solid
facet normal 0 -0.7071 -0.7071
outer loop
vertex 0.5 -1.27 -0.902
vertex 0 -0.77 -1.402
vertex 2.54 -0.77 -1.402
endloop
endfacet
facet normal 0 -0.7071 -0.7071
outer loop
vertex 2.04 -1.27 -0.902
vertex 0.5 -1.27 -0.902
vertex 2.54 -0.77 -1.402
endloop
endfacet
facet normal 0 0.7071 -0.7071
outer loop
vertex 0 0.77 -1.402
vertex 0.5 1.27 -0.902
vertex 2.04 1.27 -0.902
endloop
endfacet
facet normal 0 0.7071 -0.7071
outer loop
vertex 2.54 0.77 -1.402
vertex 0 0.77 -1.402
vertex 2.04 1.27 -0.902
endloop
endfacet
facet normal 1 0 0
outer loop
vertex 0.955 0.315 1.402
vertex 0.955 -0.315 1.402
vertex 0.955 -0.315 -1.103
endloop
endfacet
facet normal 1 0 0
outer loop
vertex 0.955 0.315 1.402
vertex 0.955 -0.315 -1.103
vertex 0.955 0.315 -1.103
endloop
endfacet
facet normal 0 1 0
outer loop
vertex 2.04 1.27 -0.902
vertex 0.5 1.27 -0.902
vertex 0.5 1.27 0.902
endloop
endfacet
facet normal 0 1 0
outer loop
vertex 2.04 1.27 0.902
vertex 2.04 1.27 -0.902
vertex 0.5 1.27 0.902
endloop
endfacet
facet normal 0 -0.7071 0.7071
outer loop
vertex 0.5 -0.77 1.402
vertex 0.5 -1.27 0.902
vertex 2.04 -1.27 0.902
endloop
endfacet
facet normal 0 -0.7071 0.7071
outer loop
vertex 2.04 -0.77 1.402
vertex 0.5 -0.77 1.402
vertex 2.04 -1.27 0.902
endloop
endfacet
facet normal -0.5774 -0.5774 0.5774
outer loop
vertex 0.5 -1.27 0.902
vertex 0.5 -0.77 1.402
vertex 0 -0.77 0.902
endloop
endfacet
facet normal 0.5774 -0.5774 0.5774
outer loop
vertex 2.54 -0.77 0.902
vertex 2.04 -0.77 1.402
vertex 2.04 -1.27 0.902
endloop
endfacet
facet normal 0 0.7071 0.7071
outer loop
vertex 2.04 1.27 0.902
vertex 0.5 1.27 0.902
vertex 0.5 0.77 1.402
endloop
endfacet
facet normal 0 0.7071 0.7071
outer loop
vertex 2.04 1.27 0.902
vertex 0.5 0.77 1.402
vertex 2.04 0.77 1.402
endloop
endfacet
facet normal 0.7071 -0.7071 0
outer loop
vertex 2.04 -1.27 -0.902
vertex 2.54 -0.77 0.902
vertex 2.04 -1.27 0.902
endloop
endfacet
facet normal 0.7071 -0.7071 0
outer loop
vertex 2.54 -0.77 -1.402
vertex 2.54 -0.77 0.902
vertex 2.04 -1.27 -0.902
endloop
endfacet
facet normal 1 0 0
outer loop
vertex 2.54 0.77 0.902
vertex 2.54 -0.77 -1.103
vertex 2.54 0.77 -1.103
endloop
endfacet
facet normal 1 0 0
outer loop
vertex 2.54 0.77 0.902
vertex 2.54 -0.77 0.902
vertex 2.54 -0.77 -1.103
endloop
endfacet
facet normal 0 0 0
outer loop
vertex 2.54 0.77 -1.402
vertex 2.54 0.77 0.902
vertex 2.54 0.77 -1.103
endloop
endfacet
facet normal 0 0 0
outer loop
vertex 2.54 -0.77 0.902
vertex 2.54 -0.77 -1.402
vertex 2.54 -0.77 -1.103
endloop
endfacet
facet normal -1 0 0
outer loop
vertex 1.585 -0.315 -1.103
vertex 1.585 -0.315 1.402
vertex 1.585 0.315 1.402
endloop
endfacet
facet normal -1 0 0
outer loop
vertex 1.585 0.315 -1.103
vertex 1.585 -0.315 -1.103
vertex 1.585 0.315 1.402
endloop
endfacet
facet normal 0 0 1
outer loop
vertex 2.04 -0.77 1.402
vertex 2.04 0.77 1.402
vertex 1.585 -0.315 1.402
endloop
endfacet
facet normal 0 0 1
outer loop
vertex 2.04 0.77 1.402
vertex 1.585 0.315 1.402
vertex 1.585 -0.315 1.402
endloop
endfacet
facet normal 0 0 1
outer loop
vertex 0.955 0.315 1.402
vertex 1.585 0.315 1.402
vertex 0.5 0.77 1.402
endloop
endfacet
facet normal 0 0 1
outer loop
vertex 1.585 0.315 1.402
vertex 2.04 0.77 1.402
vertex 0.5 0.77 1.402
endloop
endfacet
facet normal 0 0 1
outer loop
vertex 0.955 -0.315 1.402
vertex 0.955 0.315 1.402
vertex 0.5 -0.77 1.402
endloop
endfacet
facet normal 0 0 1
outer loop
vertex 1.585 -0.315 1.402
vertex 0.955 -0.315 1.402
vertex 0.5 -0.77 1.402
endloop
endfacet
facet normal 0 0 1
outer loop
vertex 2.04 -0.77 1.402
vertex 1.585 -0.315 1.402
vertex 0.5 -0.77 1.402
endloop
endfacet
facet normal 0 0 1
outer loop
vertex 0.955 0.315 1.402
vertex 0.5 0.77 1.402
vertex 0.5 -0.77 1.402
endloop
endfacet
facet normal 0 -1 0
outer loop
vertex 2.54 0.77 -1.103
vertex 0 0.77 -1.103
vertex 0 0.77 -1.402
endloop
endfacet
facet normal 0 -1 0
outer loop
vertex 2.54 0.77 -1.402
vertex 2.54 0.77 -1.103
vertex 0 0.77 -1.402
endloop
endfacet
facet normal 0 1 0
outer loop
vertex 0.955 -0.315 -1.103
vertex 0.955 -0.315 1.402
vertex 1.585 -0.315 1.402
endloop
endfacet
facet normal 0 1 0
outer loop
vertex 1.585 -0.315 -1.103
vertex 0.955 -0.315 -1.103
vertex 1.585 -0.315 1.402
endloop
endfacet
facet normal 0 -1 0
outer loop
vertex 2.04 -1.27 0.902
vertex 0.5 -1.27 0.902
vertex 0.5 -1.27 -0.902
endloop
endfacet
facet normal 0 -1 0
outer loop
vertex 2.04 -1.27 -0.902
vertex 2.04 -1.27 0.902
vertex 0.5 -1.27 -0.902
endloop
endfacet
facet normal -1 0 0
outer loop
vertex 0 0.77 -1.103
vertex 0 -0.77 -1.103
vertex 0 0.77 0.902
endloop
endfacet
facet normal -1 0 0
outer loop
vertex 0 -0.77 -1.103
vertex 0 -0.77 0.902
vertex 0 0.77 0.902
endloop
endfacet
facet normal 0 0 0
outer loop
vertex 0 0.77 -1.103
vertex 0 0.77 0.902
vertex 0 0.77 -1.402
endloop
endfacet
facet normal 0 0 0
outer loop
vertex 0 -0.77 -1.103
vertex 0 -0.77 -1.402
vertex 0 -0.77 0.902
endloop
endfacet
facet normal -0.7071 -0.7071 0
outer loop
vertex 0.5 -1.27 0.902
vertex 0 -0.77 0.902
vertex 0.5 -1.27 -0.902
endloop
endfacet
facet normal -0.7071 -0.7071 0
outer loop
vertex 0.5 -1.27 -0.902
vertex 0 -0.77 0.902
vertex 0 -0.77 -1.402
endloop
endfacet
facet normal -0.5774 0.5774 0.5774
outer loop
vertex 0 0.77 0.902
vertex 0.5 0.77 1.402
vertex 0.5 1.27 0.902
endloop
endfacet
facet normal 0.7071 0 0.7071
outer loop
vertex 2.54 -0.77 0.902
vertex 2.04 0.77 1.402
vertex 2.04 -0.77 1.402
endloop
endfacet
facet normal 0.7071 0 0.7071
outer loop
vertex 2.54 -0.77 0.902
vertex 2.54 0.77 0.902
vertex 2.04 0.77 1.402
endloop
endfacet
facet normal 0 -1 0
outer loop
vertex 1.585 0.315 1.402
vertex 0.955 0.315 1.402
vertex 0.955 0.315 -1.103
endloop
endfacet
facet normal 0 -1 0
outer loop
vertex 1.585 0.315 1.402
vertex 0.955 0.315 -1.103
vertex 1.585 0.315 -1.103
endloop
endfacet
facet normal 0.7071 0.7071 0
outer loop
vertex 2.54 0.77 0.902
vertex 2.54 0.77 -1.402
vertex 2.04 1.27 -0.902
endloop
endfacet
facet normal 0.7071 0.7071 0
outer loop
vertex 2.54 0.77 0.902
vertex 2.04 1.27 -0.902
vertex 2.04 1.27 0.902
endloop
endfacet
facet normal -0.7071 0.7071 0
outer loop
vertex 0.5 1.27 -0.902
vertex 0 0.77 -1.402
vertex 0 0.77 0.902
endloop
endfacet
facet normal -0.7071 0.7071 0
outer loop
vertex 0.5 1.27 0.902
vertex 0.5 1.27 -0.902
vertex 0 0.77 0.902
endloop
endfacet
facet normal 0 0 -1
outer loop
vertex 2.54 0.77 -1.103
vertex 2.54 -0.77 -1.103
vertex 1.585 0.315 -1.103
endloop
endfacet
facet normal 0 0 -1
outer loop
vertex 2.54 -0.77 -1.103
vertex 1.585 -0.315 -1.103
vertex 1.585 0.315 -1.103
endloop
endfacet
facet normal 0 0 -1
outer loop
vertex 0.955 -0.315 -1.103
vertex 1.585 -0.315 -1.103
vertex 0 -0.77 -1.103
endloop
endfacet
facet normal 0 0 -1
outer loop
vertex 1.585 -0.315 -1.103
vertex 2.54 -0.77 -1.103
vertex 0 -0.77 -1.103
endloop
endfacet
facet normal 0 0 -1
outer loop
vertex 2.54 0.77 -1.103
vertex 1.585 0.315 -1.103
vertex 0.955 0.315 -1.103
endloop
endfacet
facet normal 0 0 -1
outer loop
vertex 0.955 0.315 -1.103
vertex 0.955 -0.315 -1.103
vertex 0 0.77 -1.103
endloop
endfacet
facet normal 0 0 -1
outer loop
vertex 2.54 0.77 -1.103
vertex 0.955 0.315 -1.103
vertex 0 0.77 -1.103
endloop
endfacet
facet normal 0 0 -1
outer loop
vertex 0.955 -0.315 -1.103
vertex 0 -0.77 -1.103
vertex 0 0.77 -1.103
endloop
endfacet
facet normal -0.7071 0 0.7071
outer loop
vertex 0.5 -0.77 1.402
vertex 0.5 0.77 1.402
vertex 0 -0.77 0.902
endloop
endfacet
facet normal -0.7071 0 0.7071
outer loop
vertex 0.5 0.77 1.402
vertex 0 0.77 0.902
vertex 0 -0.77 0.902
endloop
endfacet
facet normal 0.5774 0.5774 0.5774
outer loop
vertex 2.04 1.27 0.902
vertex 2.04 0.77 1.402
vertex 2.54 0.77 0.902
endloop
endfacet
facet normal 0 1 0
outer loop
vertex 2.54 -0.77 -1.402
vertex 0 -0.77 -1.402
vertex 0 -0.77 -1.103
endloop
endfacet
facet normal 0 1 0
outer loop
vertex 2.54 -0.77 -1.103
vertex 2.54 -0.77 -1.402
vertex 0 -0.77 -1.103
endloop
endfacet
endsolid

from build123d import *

# Parameters (mm, degrees)
F1_DEPTH = 2.54
F2_SIZE  = 0.49999
F3_W     = 0.63
F3_H     = 0.63
F4_DEPTH = 2.505


# Not quite as in the source:
# - a fillet or chamfer is up to 0.001 mm smaller than in the source, because OpenCascade refuses the exact size


with BuildPart() as f1:
    # F0 (on Right) → F1 (new body)
    with BuildSketch(Plane.YZ):
        Polygon((1.27, 1.402), (-1.27, 1.402), (-1.27, -1.402), (-0.77, -1.402), (-0.77, -1.103), (0.77, -1.103), (0.77, -1.402), (1.27, -1.402), align=None)
    extrude(amount=F1_DEPTH)

    # F2 (size 0.5 in the source; OpenCascade refuses exactly that, so slightly less here)
    f2_edges = [f1.edges().sort_by_distance(p)[0] for p in [
        (2.54, 0, 1.402),
        (0, 0, 1.402),
        (1.27, -1.27, 1.402),
        (1.27, 1.27, 1.402),
        (2.54, 1.27, 0),
        (1.27, 1.27, -1.402),
        (0, 1.27, 0),
        (2.54, -1.27, 0),
        (0, -1.27, 0),
        (1.27, -1.27, -1.402),
    ]]
    chamfer(f2_edges, length=F2_SIZE)

    # F3 (on face) → F4 (cut, through all)
    with BuildSketch(Plane.XY.offset(1.402)):
        with Locations((1.27, 0)):
            Rectangle(F3_W, F3_H)
    extrude(amount=-F4_DEPTH, mode=Mode.SUBTRACT)


solid = f1.part
